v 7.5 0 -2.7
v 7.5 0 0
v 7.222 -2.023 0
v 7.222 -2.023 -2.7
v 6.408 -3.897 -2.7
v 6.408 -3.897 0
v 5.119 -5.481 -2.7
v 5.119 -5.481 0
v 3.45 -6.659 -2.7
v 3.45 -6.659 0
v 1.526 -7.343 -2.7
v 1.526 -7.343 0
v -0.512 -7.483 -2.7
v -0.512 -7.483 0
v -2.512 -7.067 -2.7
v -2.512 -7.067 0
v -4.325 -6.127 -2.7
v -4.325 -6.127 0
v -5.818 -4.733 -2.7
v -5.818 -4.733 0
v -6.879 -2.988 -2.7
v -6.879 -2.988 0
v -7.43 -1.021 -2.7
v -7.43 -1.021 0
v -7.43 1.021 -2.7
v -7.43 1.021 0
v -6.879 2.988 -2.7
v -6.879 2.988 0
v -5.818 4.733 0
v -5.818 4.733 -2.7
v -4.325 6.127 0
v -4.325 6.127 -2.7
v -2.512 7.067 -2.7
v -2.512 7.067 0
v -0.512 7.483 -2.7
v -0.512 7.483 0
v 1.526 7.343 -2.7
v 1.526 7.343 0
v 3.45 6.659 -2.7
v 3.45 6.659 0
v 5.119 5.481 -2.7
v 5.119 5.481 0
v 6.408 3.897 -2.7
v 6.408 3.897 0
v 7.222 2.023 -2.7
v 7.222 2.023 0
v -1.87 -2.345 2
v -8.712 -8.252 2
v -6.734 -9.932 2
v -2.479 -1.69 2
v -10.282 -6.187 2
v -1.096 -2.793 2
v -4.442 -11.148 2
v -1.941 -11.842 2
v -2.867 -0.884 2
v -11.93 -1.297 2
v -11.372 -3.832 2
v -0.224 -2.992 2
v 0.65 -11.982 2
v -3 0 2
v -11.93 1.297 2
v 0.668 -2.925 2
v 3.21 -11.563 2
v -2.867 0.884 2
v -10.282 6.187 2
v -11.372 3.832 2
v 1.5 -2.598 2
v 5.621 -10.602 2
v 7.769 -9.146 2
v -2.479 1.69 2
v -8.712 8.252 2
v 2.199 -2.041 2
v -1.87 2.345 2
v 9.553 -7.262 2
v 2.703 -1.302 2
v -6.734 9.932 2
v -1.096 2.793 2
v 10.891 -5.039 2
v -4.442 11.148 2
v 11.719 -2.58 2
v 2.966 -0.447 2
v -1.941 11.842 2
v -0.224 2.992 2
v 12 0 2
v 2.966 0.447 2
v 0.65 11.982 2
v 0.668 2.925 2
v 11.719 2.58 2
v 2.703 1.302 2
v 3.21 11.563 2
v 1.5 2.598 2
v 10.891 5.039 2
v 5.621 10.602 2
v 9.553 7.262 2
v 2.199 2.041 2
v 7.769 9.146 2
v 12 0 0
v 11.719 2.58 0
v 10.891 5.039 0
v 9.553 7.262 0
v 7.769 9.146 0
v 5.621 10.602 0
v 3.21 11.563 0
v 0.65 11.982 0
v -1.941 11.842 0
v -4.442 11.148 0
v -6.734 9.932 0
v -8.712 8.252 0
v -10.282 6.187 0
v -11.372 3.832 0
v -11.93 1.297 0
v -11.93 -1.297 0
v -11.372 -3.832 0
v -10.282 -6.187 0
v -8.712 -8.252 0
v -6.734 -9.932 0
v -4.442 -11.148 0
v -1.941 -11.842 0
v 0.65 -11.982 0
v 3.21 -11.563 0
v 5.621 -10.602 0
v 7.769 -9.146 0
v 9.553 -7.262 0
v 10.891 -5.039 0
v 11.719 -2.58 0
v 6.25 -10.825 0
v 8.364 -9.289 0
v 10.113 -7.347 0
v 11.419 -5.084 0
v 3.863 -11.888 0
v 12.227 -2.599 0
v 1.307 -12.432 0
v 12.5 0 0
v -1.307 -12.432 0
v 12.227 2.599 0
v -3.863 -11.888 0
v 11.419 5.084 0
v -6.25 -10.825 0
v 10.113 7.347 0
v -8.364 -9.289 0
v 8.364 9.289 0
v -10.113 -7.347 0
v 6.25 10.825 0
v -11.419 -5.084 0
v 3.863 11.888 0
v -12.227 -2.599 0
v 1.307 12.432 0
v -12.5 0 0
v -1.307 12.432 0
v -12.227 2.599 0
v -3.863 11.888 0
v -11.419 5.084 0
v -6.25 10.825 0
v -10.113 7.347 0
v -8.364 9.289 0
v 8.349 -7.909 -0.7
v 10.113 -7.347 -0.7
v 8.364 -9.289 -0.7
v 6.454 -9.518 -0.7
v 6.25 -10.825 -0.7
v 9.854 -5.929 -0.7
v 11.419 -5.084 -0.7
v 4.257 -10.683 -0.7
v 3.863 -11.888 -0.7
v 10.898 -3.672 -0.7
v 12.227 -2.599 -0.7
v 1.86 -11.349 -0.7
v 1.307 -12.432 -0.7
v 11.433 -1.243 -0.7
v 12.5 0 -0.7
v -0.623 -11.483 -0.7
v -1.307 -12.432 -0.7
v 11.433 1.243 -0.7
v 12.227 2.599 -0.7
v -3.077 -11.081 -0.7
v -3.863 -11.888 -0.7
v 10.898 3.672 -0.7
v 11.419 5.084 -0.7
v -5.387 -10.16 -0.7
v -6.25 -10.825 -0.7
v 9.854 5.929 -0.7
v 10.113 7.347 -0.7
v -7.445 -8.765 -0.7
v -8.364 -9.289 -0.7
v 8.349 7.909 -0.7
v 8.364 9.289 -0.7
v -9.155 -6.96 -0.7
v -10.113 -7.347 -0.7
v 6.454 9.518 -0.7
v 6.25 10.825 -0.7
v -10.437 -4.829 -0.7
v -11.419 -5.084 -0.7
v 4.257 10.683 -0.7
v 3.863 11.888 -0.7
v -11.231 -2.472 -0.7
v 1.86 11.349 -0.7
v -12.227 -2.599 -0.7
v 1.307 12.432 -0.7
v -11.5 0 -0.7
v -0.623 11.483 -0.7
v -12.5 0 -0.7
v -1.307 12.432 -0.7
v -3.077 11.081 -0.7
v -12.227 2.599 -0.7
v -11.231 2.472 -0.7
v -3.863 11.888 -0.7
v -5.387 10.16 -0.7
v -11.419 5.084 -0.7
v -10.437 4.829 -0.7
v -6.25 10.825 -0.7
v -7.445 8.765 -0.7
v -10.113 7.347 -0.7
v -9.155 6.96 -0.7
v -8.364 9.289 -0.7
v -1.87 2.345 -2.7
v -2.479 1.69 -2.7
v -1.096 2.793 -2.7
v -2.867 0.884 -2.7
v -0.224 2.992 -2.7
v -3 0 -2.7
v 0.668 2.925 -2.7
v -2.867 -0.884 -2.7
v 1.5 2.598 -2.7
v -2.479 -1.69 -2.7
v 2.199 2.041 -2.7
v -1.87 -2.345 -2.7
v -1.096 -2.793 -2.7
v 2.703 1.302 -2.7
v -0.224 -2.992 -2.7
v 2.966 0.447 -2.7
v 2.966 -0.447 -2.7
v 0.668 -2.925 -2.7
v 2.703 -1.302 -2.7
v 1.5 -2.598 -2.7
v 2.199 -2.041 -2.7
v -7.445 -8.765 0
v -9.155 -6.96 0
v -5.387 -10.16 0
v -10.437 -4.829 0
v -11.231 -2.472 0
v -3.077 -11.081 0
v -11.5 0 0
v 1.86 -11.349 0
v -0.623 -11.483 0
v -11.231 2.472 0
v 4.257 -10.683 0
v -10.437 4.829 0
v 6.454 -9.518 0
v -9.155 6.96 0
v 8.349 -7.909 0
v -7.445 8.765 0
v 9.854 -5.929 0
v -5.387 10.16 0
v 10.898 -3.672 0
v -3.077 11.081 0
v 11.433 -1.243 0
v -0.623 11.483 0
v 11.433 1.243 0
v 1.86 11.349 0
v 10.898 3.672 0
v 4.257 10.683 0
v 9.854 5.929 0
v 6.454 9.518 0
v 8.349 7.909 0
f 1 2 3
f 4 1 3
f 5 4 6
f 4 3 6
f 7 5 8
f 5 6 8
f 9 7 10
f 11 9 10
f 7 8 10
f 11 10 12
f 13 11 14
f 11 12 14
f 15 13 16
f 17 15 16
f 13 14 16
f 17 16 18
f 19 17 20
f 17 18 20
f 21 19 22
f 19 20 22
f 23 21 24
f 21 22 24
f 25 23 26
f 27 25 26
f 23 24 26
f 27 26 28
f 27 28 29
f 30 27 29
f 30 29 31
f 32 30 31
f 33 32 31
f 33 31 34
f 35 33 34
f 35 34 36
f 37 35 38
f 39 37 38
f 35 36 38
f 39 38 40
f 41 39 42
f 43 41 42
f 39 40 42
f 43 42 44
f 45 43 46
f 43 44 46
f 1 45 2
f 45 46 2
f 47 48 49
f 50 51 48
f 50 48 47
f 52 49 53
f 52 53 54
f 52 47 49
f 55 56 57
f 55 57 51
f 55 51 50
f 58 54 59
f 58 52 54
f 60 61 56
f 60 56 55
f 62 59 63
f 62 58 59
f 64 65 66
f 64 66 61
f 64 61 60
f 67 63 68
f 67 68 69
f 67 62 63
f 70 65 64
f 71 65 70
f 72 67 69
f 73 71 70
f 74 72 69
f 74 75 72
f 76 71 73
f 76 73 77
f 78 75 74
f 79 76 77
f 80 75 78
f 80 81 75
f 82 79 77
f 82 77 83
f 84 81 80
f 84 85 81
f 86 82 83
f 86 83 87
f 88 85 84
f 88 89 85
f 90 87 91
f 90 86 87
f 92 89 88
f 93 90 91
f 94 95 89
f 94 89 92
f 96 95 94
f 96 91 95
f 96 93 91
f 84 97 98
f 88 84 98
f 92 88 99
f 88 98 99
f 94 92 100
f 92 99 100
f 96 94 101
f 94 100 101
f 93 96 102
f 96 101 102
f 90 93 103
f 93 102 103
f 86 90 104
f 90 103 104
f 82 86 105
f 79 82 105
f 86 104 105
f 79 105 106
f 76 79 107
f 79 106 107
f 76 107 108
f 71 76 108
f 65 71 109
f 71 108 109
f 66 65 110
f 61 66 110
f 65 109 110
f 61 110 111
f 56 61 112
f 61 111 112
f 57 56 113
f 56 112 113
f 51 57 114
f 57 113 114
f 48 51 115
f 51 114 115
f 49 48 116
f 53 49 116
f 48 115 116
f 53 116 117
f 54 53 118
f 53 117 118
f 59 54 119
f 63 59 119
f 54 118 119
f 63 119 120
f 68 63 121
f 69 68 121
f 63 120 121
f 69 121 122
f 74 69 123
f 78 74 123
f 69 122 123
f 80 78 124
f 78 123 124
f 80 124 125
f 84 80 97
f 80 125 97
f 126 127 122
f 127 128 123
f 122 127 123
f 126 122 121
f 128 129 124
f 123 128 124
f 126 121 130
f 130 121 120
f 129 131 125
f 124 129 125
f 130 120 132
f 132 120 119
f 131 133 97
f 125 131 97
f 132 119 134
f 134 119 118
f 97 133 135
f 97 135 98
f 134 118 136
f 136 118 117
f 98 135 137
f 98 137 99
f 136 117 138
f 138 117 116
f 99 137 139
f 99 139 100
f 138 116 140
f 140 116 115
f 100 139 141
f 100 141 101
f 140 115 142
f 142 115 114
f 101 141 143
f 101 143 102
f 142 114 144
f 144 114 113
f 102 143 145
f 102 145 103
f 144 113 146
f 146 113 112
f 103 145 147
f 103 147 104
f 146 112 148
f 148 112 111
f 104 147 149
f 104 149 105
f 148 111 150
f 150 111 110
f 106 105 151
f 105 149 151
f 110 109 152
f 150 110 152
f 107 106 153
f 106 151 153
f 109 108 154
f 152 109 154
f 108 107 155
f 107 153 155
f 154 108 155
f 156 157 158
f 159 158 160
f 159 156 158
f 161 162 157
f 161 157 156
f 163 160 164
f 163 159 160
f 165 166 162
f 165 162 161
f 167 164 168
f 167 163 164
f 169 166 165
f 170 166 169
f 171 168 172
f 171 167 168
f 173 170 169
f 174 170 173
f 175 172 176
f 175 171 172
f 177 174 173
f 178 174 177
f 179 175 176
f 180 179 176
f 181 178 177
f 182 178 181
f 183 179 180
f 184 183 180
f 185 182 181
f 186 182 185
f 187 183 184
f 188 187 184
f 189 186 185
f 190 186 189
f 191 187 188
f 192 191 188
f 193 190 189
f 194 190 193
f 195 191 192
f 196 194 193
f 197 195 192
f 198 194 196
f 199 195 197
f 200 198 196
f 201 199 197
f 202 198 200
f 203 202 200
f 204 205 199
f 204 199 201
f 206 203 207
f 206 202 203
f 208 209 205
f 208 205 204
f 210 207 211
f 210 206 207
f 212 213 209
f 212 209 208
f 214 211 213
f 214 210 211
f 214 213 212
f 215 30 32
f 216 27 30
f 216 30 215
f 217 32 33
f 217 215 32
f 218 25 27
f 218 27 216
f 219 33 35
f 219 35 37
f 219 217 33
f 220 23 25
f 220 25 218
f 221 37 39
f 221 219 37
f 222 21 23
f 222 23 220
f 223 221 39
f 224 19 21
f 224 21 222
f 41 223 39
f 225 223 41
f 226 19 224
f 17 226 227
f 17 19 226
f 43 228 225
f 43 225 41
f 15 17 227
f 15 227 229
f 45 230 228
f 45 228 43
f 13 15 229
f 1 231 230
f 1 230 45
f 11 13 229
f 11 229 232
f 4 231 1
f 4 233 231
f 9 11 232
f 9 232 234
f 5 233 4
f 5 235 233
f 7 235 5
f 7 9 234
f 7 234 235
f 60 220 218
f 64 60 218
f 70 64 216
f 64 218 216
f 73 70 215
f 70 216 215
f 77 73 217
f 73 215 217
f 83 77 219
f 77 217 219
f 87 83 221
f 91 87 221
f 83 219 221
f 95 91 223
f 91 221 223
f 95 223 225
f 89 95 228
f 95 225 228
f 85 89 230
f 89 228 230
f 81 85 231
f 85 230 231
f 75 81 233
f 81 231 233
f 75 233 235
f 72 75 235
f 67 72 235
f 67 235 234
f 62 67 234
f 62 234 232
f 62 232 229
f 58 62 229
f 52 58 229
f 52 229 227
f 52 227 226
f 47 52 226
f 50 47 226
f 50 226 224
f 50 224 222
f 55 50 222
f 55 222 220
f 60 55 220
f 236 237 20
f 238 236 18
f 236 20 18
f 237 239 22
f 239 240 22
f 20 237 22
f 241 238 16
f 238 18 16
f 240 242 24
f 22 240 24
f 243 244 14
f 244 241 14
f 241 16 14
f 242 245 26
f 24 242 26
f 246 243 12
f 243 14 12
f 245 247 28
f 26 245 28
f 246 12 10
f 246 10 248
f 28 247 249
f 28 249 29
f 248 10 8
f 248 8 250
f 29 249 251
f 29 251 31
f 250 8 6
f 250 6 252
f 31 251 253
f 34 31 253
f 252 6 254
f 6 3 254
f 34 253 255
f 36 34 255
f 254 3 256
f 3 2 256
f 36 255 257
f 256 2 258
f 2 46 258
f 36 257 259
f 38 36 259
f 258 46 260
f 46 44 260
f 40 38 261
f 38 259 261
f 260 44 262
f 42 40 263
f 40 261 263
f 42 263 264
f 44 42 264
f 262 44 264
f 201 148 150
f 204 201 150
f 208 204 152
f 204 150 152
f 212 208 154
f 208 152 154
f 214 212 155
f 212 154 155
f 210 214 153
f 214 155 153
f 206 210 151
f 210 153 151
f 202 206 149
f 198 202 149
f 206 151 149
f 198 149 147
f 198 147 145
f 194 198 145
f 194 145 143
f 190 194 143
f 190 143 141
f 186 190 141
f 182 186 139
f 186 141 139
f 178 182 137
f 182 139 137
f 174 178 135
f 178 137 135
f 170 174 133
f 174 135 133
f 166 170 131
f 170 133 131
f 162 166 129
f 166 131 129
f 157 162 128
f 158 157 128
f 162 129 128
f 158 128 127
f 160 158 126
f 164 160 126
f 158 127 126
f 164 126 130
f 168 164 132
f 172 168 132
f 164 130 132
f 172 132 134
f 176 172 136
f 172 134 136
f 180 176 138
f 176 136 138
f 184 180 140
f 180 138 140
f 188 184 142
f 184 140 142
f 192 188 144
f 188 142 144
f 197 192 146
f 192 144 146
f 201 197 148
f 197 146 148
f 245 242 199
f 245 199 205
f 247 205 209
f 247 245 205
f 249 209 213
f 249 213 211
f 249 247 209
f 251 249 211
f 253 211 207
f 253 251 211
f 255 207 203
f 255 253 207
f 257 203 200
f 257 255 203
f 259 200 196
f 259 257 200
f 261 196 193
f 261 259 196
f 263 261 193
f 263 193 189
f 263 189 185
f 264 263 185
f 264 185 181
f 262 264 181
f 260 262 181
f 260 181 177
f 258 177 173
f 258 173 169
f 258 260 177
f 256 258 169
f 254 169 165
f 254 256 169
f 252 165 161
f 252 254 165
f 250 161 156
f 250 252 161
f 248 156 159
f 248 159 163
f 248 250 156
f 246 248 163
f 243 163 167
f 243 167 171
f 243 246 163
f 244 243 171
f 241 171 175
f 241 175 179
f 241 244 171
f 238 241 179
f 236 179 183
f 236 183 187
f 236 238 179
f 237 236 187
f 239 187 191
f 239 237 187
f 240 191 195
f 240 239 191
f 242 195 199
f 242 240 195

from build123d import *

# Parameters (mm, degrees)
SKETCH1_R           = 12
BOSS_EXTRUDE1_DEPTH = 2
SKETCH2_R           = 12.5
SKETCH2_R_2         = 11.5
BOSS_EXTRUDE2_DEPTH = 0.7
SKETCH3_R           = 3
CUT_EXTRUDE1_DEPTH  = 18.790446875
SKETCH4_R           = 7.5
BOSS_EXTRUDE4_DEPTH = 2.7
SKETCH5_R           = 3
CUT_EXTRUDE3_DEPTH  = 19.291801442


with BuildPart() as part:
    # Sketch1 → Boss-Extrude1 (new body)
    with BuildSketch(Plane.XY):
        Circle(SKETCH1_R)
    extrude(amount=BOSS_EXTRUDE1_DEPTH)

    # Sketch2 → Boss-Extrude2 (add)
    with BuildSketch(Plane(origin=(0, 0, 0), x_dir=(-1, 0, 0), z_dir=(0, 0, -1))):
        Circle(SKETCH2_R)
        Circle(SKETCH2_R_2, mode=Mode.SUBTRACT)
    extrude(amount=BOSS_EXTRUDE2_DEPTH)

    # Sketch3 → Cut-Extrude1 (cut, through all)
    with BuildSketch(Plane(origin=(0, 0, 0), x_dir=(-1, 0, 0), z_dir=(0, 0, -1))):
        Circle(SKETCH3_R)
    extrude(amount=-CUT_EXTRUDE1_DEPTH, mode=Mode.SUBTRACT)

    # Sketch4 → Boss-Extrude4 (add)
    with BuildSketch(Plane(origin=(0, 0, 0), x_dir=(-1, 0, 0), z_dir=(0, 0, -1))):
        with Locations(Location((0, 0, 0), (0, 0, 180))):
            Circle(SKETCH4_R)
    extrude(amount=BOSS_EXTRUDE4_DEPTH)

    # Sketch5 → Cut-Extrude3 (cut, through all)
    with BuildSketch(Plane(origin=(0, 0, -2.7), x_dir=(-1, 0, 0), z_dir=(0, 0, -1))):
        Circle(SKETCH5_R)
    extrude(amount=-CUT_EXTRUDE3_DEPTH, mode=Mode.SUBTRACT)


solid = part.part
